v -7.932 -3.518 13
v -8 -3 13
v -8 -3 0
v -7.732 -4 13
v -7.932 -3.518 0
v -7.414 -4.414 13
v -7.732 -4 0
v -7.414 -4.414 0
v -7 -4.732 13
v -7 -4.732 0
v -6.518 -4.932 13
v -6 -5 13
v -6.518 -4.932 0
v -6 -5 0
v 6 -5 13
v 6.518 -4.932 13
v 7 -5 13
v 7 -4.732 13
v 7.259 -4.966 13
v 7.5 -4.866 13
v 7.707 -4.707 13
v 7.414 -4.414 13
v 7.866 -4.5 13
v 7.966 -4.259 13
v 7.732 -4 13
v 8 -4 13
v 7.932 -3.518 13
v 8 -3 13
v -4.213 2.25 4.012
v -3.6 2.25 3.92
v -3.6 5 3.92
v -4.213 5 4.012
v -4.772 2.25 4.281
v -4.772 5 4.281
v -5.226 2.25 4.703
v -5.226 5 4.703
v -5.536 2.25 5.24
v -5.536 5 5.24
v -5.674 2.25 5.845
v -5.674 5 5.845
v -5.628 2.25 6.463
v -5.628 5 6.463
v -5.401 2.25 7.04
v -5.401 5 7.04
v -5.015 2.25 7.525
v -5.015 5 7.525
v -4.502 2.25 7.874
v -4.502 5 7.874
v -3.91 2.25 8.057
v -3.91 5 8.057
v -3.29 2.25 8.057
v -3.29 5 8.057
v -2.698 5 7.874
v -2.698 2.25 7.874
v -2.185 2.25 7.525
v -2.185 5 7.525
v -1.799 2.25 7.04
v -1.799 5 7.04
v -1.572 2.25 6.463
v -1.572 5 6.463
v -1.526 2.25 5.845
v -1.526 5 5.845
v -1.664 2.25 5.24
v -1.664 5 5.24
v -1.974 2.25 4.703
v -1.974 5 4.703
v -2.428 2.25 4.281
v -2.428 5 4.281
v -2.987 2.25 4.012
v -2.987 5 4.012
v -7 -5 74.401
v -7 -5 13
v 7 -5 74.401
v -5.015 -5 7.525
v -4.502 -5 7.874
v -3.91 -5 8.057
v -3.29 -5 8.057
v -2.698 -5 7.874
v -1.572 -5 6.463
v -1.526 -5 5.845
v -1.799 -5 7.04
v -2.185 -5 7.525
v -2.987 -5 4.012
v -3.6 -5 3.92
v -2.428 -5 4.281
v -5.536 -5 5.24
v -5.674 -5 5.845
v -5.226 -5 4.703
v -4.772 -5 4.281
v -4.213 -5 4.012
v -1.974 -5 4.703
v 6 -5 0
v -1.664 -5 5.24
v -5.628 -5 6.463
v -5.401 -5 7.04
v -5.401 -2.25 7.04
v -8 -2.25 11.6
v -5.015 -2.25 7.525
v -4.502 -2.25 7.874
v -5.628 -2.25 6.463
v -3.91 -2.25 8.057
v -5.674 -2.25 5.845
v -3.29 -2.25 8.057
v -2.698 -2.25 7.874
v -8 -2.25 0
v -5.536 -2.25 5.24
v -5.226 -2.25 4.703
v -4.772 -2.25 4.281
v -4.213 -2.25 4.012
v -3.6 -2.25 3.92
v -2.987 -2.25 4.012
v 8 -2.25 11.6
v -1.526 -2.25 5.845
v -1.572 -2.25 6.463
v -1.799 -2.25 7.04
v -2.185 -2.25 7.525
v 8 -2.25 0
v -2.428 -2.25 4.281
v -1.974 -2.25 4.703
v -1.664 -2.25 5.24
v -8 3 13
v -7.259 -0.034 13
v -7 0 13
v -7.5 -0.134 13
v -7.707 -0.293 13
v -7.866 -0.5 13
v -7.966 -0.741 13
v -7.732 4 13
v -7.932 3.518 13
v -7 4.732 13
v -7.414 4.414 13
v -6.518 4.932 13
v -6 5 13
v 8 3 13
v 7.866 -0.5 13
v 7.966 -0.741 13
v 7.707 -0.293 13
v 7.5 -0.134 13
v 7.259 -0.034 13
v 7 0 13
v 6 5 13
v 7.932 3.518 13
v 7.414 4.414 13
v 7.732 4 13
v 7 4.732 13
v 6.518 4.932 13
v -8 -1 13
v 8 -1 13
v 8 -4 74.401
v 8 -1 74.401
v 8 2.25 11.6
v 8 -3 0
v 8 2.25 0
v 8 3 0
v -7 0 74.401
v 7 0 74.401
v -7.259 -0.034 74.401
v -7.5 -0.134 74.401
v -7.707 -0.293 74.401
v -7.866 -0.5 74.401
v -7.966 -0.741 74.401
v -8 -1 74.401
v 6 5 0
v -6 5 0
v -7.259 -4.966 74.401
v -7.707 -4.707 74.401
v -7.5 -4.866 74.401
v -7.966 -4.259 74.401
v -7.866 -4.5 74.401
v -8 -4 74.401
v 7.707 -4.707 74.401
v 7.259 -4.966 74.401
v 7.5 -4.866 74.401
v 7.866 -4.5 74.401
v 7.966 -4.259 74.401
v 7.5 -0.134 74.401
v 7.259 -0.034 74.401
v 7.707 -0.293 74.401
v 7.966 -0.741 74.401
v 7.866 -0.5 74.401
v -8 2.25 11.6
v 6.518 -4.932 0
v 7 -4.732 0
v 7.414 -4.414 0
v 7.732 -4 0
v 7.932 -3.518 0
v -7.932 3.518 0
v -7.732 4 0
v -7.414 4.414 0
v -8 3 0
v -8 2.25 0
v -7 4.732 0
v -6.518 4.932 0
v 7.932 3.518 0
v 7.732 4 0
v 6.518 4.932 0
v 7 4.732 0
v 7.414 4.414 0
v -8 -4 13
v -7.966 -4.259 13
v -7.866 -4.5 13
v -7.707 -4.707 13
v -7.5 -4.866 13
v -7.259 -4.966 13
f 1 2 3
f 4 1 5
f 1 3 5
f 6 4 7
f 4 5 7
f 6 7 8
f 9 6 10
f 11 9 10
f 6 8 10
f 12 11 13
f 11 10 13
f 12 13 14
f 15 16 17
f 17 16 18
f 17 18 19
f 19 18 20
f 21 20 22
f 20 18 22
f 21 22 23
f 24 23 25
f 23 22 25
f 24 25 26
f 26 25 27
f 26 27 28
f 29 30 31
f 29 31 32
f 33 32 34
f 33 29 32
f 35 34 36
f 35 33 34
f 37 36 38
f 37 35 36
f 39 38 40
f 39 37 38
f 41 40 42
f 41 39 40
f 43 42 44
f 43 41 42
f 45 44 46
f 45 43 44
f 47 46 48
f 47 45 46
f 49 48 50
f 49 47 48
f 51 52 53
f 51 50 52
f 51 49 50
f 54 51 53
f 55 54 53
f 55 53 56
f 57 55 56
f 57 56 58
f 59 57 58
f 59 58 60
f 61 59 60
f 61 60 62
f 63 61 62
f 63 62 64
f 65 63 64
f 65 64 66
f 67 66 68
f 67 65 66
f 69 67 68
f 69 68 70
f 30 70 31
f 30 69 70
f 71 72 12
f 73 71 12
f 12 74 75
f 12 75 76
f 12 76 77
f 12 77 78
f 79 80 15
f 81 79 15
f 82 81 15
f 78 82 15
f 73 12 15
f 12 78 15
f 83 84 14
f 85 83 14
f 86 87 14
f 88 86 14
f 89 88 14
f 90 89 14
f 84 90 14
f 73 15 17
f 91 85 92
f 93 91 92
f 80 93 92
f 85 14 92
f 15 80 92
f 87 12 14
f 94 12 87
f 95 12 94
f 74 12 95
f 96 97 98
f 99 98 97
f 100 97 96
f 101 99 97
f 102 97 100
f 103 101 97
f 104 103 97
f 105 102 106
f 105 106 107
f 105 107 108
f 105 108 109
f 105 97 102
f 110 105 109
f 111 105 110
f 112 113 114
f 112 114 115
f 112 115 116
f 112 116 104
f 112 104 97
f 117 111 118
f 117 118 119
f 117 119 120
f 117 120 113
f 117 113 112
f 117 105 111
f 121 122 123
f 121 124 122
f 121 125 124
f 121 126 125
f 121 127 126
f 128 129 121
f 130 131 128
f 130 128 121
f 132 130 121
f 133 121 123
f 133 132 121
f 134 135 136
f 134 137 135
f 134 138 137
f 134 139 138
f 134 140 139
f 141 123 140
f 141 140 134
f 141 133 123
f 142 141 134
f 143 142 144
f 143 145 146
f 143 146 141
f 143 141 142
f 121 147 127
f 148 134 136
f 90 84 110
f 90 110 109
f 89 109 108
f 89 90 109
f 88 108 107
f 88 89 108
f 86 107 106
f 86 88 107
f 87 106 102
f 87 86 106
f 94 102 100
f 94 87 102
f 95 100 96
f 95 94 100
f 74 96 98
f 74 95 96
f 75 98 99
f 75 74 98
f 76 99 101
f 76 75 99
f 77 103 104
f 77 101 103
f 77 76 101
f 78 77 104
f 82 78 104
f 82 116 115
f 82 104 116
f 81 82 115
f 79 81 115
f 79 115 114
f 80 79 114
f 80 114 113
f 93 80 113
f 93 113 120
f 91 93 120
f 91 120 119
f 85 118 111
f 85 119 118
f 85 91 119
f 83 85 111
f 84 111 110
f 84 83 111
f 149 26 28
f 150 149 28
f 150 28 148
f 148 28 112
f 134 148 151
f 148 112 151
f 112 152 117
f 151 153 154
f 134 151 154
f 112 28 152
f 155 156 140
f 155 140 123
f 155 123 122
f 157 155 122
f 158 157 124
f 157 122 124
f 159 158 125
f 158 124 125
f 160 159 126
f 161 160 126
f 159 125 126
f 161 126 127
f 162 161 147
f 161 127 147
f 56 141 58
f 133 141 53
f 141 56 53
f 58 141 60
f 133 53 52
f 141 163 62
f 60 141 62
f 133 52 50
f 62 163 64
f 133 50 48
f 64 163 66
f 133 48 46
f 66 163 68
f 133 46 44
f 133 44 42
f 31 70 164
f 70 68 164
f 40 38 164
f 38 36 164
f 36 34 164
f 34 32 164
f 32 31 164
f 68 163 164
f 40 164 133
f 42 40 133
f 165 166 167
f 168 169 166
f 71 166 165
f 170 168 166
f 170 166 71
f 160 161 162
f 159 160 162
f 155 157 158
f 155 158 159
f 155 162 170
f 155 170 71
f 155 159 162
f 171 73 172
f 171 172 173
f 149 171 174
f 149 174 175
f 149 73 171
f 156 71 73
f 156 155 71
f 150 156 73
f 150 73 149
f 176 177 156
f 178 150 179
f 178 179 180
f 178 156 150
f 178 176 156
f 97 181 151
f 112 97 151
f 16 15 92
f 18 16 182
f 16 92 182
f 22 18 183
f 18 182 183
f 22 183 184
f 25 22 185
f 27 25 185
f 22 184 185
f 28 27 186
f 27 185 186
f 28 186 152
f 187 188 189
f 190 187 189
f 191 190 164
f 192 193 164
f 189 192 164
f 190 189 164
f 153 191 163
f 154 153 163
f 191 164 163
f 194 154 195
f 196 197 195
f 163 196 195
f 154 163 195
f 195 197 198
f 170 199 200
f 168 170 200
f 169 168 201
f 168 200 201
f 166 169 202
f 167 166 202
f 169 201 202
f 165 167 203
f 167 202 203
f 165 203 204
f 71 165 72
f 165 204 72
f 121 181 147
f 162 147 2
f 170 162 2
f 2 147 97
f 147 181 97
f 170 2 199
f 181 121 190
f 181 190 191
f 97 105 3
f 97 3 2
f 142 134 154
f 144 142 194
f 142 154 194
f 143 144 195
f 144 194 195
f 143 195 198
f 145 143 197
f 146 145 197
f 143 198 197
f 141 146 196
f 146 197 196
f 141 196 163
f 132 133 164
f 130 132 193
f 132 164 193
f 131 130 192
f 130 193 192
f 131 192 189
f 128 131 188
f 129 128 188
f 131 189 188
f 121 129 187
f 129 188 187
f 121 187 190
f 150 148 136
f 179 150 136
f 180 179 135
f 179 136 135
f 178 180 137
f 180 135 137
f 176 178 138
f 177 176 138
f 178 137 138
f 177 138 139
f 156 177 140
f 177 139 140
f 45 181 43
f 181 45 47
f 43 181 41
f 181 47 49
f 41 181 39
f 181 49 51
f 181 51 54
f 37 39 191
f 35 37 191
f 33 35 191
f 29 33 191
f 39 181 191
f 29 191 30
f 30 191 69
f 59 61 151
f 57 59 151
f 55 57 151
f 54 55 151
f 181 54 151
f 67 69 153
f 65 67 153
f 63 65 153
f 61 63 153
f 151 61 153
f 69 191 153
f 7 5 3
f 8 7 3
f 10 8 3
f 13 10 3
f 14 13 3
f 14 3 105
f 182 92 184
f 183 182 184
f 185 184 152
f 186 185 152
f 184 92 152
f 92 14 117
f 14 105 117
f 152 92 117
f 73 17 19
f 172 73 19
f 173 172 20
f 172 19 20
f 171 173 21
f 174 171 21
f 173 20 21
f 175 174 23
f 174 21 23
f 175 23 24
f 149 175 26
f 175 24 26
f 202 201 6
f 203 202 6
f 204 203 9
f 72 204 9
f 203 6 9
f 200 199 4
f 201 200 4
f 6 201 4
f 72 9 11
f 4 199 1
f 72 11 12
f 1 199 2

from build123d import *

# Parameters (mm, degrees)
F_01_START                                = 13
F_01_TPU_16_BY_5_GAUGE_DEPTH              = 61.40149944
F_02_CORD_END_BLOCK_DEPTH                 = 13
F_03_START                                = -0.2
S03_OPEN_TWO_EAR_PIN_CLEVIS_W             = 18
S03_OPEN_TWO_EAR_PIN_CLEVIS_H             = 4.5
F_03_OPEN_TWO_EAR_PIN_CLEVIS_DEPTH        = 11.8
F_04_START                                = -5.2
S04_SHOULDER_PIN_THROUGH_BOTH_EARS_R      = 2.08
F_04_SHOULDER_PIN_THROUGH_BOTH_EARS_DEPTH = 10.4


# Read off the part's stored shape, not the designer's step: 01 - TPU 16 by 5 gauge
with BuildPart() as part:
    # 01 - TPU 16 by 5 gauge outline → 01 - TPU 16 by 5 gauge (new body)
    with BuildSketch(Plane.XY.offset(F_01_START)):
        with BuildLine():
            ThreePointArc((-8, -4), (-7.707106781, -4.707106781), (-7, -5))
            Line((-7, -5), (7, -5))
            ThreePointArc((7, -5), (7.707106781, -4.707106781), (8, -4))
            Line((8, -4), (8, -1))
            ThreePointArc((8, -1), (7.707106781, -0.292893219), (7, 0))
            Line((7, 0), (-7, 0))
            ThreePointArc((-7, 0), (-7.707106781, -0.292893219), (-8, -1))
            Line((-8, -1), (-8, -4))
        make_face()
    extrude(amount=F_01_TPU_16_BY_5_GAUGE_DEPTH)

    # S02 - Cord end block → 02 - Cord end block (add)
    with BuildSketch(Plane.XY):
        with BuildLine():
            Line((-6, -5), (6, -5))
            ThreePointArc((6, -5), (7.414213562, -4.414213562), (8, -3))
            Line((8, -3), (8, 3))
            ThreePointArc((8, 3), (7.414213562, 4.414213562), (6, 5))
            Line((6, 5), (-6, 5))
            ThreePointArc((-6, 5), (-7.414213562, 4.414213562), (-8, 3))
            Line((-8, 3), (-8, -3))
            ThreePointArc((-8, -3), (-7.414213562, -4.414213562), (-6, -5))
        make_face()
    extrude(amount=F_02_CORD_END_BLOCK_DEPTH)

    # S03 - Open two-ear pin clevis → 03 - Open two-ear pin clevis (cut)
    with BuildSketch(Plane.XY.offset(F_03_START)):
        Rectangle(S03_OPEN_TWO_EAR_PIN_CLEVIS_W, S03_OPEN_TWO_EAR_PIN_CLEVIS_H)
    extrude(amount=F_03_OPEN_TWO_EAR_PIN_CLEVIS_DEPTH, mode=Mode.SUBTRACT)

    # S04 - Shoulder pin through both ears → 04 - Shoulder pin through both ears (cut)
    with BuildSketch(Plane(origin=(0, 0, 0), x_dir=(1, 0, 0), z_dir=(0, 1, 0)).offset(F_04_START)):
        with Locations(Location((-3.6, -6, 0), (0, 0, 90))):
            Circle(S04_SHOULDER_PIN_THROUGH_BOTH_EARS_R)
    extrude(amount=F_04_SHOULDER_PIN_THROUGH_BOTH_EARS_DEPTH, mode=Mode.SUBTRACT)


solid = part.part
